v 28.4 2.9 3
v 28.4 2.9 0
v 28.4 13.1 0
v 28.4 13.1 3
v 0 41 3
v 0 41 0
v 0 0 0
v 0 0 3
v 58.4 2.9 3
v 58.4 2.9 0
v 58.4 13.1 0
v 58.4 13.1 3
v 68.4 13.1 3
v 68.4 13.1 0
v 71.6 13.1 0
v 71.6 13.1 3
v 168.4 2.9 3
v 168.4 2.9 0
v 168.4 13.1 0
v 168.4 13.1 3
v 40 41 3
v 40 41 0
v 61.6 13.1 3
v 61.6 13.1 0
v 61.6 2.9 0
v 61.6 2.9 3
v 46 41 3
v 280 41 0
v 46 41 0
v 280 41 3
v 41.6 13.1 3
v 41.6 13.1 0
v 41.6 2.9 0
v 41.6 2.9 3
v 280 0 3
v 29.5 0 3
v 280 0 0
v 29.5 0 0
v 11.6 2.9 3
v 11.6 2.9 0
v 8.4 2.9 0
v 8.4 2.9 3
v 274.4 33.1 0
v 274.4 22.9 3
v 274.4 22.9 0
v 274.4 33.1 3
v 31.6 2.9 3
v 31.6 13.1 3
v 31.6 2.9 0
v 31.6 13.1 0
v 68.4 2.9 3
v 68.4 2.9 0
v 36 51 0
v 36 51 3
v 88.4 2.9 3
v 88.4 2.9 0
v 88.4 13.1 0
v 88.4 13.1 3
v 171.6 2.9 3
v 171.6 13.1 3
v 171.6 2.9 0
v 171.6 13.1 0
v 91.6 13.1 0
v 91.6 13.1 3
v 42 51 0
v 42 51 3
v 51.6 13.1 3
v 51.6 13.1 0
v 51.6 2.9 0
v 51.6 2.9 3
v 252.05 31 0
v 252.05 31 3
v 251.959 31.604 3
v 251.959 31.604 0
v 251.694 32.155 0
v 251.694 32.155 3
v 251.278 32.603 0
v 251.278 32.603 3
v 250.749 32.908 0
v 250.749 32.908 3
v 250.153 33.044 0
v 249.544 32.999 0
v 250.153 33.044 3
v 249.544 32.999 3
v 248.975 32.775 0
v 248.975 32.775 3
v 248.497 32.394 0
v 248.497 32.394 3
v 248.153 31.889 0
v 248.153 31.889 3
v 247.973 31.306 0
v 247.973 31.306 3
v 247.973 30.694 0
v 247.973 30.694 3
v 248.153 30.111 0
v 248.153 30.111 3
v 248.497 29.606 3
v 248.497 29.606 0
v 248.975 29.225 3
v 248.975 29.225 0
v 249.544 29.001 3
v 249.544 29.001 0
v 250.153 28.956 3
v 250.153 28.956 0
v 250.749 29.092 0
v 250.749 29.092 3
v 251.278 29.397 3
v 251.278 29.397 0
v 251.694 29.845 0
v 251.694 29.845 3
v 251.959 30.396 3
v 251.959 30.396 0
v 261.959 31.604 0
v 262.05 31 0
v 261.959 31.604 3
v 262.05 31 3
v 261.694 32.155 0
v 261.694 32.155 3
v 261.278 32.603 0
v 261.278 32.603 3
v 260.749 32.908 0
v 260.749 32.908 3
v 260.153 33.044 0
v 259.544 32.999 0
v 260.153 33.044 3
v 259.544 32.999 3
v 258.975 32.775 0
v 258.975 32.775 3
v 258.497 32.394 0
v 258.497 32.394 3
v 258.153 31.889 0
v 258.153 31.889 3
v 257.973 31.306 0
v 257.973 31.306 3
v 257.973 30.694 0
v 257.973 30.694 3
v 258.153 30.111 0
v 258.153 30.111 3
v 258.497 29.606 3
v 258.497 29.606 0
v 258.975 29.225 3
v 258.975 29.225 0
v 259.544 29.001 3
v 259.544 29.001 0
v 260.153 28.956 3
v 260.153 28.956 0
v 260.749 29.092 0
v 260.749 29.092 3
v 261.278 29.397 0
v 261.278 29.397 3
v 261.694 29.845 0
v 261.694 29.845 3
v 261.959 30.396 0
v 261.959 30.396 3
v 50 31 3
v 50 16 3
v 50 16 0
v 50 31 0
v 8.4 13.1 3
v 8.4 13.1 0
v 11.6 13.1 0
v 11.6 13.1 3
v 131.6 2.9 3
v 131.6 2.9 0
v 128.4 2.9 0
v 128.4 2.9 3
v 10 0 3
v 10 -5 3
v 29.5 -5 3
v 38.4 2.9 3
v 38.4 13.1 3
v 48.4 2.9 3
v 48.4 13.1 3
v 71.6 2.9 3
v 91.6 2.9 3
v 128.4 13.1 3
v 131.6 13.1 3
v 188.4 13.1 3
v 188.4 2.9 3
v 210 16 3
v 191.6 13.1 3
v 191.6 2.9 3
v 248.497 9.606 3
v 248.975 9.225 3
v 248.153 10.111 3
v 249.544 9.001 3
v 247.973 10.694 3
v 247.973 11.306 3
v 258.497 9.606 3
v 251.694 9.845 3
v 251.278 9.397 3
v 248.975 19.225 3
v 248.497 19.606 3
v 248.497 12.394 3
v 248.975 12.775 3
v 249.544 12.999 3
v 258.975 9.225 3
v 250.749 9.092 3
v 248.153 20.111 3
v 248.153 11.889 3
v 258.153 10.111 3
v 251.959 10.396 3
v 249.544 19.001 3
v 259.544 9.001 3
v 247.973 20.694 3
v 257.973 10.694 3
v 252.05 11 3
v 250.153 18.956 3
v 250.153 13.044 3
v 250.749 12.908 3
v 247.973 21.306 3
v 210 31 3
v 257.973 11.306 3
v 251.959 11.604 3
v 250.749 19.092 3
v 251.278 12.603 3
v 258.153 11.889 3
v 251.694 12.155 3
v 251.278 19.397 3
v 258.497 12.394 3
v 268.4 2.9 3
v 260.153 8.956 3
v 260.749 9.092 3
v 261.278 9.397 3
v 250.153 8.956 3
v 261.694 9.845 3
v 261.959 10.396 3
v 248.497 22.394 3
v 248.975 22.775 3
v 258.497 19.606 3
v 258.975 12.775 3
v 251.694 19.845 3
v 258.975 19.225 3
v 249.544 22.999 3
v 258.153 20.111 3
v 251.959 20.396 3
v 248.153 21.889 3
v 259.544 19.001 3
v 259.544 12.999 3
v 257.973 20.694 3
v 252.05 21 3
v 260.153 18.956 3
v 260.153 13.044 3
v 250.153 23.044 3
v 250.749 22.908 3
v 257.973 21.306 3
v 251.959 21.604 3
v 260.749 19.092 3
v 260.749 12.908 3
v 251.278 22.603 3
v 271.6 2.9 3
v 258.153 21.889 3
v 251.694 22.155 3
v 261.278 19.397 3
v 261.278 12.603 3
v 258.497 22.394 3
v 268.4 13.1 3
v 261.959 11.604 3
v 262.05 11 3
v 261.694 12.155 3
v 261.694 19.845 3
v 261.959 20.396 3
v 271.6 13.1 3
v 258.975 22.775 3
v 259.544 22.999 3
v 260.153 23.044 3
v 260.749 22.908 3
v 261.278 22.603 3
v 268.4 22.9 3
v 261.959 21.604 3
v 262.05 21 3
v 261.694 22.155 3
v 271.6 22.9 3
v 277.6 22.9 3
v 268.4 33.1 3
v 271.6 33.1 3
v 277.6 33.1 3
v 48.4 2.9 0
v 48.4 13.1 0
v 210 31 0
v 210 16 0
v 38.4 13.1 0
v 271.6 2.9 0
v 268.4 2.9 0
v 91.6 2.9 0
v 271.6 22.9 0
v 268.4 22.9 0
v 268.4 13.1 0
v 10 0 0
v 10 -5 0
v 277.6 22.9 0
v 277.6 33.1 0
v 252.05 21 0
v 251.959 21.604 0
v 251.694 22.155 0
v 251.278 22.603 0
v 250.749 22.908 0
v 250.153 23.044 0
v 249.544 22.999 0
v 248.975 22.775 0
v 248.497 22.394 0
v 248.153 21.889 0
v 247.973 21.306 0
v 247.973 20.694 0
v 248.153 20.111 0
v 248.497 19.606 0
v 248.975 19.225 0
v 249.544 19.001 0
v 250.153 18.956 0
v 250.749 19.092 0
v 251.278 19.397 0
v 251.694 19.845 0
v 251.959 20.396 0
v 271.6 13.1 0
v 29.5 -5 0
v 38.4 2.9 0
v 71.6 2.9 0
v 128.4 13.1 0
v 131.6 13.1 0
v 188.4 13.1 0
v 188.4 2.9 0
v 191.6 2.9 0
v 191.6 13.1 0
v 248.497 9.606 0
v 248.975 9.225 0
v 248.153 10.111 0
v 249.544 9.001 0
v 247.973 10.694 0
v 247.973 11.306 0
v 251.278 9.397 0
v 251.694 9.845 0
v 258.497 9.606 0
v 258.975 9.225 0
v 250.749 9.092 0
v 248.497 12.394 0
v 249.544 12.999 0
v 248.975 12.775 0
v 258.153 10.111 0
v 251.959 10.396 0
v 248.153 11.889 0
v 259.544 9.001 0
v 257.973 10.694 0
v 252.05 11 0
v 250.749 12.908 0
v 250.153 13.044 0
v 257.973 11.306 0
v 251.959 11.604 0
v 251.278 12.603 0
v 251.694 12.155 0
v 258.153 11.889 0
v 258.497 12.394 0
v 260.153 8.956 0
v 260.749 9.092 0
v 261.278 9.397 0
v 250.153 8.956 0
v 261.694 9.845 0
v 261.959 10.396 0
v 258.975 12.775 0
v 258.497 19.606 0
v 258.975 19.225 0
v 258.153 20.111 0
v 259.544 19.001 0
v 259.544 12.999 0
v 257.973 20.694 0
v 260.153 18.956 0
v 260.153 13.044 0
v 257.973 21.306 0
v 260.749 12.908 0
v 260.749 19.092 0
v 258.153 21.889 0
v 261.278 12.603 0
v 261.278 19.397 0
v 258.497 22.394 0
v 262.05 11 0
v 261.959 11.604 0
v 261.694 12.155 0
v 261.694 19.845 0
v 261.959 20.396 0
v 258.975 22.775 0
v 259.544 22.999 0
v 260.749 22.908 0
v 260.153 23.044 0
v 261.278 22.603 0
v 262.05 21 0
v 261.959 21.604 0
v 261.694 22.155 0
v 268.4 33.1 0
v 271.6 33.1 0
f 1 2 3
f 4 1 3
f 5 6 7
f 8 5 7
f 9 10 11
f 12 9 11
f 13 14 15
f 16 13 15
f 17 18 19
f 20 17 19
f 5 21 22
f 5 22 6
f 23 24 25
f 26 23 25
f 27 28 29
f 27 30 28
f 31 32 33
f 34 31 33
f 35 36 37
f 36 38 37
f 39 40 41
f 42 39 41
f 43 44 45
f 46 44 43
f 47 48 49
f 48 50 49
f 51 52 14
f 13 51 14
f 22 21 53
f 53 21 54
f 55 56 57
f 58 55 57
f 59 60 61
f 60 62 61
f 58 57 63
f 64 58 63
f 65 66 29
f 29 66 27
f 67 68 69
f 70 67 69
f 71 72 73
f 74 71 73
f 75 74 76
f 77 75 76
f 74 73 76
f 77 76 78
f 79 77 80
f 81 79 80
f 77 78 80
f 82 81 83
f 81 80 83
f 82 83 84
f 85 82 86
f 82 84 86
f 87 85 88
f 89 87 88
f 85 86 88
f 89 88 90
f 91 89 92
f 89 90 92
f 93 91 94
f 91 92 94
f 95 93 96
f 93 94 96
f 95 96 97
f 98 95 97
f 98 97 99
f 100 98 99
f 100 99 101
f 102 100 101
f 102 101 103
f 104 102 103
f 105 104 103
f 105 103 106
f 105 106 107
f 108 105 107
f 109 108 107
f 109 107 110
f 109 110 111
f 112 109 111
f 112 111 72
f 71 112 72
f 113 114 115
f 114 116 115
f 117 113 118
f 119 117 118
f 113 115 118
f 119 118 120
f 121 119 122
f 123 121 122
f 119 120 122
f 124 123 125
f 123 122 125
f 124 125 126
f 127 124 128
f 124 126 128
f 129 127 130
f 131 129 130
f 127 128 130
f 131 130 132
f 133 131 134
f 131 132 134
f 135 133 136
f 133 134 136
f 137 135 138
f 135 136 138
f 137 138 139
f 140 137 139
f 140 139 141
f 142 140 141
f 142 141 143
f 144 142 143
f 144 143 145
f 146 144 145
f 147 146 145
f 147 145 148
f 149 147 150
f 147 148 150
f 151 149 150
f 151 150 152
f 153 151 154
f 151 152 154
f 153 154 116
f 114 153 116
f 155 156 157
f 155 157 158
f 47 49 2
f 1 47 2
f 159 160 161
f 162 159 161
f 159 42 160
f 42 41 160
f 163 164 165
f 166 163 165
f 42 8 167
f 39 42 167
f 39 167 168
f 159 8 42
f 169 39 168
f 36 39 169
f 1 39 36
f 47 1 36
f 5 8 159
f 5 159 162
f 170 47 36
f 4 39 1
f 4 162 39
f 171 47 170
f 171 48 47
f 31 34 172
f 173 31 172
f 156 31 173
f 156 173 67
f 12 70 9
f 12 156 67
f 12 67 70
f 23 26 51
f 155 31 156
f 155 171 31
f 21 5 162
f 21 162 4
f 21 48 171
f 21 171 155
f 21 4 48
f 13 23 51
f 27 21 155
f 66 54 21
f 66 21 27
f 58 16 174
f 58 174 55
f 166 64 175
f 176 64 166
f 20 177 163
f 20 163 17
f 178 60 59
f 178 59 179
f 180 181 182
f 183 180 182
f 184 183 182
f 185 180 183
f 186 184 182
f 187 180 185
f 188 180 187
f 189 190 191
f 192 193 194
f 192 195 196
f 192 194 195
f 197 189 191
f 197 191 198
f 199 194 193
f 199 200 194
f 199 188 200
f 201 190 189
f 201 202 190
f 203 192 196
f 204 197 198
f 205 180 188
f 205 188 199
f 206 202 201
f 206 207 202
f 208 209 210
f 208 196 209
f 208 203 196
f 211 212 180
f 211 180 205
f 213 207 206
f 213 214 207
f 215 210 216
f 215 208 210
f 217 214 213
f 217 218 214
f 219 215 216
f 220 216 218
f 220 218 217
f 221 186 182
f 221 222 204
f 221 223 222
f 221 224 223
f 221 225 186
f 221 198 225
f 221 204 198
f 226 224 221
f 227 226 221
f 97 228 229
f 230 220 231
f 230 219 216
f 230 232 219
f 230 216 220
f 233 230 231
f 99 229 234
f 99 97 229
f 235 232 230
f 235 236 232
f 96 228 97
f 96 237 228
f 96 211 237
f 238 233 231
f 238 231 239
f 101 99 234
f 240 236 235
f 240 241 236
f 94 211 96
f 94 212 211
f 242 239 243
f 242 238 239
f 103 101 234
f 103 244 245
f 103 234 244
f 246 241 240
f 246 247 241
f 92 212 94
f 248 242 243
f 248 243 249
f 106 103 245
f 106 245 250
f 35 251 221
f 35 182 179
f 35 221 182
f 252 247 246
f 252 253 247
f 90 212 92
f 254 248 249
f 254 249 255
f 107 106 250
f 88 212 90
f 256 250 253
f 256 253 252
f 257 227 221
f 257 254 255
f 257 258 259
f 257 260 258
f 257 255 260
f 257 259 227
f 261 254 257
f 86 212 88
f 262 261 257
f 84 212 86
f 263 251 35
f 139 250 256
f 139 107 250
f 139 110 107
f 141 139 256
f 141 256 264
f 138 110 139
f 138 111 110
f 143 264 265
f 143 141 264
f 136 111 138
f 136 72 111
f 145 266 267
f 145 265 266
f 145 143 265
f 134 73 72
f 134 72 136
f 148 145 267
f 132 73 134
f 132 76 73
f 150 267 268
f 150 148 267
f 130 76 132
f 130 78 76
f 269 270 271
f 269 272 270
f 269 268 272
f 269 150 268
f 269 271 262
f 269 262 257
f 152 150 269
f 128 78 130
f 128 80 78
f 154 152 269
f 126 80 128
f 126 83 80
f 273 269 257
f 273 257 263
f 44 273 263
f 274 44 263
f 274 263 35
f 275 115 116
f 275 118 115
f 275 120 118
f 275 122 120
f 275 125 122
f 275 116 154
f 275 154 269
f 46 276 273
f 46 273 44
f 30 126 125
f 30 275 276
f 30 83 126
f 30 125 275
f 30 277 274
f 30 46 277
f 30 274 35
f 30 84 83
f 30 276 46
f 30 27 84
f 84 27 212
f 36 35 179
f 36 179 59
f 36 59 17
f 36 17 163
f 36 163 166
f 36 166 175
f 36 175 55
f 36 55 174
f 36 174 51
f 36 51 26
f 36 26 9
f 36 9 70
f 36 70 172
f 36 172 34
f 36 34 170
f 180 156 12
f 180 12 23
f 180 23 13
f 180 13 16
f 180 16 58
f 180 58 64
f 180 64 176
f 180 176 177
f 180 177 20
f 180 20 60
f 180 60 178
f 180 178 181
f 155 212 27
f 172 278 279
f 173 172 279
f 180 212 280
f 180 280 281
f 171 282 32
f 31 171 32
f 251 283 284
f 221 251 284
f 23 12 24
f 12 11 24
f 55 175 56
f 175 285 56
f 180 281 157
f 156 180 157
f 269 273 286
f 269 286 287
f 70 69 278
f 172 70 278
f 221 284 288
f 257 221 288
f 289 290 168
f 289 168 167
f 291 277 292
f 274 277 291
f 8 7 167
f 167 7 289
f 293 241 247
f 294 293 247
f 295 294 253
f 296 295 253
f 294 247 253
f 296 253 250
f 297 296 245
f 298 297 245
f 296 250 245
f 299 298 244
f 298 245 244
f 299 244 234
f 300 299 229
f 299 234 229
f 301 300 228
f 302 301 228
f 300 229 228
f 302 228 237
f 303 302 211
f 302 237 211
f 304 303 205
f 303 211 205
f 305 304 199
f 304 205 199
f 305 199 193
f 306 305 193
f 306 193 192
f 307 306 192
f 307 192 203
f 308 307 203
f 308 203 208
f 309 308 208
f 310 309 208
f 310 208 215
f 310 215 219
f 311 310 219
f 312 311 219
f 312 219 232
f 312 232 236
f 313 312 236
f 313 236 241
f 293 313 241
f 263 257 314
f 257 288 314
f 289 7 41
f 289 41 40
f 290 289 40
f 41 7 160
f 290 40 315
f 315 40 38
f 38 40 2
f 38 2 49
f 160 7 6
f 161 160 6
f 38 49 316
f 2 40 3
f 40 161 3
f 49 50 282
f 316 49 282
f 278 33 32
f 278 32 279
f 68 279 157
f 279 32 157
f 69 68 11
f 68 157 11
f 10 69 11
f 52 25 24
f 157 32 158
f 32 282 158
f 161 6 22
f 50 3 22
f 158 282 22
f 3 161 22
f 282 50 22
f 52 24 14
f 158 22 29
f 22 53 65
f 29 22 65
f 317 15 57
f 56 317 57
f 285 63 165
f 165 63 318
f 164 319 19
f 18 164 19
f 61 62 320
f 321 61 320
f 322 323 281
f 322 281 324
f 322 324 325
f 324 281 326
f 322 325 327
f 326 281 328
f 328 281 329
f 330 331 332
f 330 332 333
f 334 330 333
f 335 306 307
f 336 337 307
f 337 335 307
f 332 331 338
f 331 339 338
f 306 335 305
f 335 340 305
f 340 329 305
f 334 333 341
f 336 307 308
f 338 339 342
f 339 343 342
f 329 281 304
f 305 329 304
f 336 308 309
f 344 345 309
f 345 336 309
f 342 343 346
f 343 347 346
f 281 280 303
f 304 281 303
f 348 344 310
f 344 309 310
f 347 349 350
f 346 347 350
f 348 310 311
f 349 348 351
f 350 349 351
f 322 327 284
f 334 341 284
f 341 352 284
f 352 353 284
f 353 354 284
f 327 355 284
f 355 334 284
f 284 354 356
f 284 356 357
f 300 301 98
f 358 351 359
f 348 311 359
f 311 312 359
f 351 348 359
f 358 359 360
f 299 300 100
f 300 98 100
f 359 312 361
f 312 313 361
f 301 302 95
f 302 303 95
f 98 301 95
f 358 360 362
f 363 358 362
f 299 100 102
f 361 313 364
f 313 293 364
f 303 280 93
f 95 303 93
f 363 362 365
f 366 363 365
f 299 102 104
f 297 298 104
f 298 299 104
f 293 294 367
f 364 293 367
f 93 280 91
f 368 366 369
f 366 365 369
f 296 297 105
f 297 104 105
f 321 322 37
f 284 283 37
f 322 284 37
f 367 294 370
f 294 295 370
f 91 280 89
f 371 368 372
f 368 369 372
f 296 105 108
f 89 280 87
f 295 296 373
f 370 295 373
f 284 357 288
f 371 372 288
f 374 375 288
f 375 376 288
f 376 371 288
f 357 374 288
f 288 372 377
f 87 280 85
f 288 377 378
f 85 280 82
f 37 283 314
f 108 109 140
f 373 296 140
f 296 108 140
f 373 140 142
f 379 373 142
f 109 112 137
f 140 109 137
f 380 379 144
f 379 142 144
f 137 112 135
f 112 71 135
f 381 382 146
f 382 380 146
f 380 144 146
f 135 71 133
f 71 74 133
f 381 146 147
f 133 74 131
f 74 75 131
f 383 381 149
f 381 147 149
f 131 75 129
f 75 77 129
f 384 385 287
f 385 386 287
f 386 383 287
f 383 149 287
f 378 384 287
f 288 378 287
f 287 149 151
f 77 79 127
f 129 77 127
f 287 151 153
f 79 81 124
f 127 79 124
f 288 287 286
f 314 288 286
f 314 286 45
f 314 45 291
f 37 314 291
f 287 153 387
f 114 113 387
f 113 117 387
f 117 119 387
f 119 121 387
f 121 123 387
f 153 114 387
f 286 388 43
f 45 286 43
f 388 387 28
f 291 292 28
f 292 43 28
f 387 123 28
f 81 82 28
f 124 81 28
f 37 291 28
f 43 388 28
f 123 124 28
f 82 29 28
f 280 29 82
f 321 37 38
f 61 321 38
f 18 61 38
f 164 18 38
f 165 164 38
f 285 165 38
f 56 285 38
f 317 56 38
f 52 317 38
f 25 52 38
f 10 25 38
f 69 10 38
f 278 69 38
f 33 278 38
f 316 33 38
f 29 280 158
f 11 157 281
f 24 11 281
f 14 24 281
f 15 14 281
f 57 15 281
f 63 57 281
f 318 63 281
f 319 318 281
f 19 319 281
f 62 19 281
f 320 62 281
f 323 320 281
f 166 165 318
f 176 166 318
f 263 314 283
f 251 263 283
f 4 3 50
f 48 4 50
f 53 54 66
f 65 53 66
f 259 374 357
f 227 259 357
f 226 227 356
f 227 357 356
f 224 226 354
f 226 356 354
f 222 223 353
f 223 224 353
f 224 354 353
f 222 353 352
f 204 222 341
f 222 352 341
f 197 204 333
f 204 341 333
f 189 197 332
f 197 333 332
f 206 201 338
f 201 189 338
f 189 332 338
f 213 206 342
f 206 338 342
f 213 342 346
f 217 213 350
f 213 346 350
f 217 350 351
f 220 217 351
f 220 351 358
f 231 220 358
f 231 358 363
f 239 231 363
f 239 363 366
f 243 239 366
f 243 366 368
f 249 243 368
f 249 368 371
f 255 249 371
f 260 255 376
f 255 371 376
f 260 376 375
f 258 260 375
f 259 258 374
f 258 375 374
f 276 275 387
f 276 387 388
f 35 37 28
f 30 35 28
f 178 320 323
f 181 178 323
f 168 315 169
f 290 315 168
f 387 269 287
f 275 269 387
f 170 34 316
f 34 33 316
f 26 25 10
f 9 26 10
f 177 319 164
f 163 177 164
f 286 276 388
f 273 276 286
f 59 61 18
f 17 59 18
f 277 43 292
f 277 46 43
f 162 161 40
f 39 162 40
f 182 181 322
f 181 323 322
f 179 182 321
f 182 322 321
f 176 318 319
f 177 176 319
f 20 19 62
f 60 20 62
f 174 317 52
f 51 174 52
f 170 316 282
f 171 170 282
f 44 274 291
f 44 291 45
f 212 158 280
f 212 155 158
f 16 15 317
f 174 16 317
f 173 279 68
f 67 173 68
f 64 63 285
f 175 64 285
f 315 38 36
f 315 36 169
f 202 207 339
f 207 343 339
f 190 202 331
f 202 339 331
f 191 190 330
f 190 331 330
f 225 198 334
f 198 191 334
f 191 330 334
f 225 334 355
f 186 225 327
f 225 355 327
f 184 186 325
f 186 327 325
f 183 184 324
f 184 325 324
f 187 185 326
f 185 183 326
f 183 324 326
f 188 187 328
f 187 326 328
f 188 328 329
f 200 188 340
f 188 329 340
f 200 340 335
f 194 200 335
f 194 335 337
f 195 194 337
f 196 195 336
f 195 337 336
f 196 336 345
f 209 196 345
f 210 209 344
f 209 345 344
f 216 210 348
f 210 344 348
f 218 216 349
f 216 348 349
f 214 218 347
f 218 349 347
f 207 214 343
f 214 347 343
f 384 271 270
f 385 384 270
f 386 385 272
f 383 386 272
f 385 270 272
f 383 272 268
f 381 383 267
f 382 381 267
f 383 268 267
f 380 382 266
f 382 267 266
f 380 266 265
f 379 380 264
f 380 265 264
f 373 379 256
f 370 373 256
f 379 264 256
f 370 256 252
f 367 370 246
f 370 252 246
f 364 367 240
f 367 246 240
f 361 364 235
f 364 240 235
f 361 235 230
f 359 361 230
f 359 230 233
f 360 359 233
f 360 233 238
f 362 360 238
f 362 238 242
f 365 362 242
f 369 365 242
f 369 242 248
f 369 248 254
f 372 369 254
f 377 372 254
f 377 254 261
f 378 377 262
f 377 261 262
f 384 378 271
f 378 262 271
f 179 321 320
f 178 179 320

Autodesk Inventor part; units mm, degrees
ref_plane "YZ Plane" through (0, 0, 0) normal (1, 0, 0) x (0, 1, 0)
ref_plane "XZ Plane" through (0, 0, 0) normal (0, 1, 0) x (-1, 0, 0)
ref_plane "XY Plane" through (0, 0, 0) normal (0, 0, 1) x (1, 0, 0)
sketch "Sketch1" plane through (0, 0, 0) normal (0, 0, 1) x (1, 0, 0)
  line L0 (0, 0) -> (280, 0)
  line L1 (280, 0) -> (280, 16)
  line L2 (280, 16) -> (0, 16)
  line L3 (0, 16) -> (0, 0)
  line L4 (0, 0) -> (22.0483, 0)
  line L5 (10, 0) -> (29.5, 0)
  line L6 (29.5, 0) -> (29.5, -5)
  line L7 (29.5, -5) -> (10, -5)
  line L8 (10, -5) -> (10, 0)
  line L9 (8.4, 13.1) -> (11.6, 13.1)
  line L10 (11.6, 13.1) -> (11.6, 2.9)
  line L11 (11.6, 2.9) -> (8.4, 2.9)
  line L12 (8.4, 2.9) -> (8.4, 13.1)
  line L13 (8.4, 13.1) -> (11.6, 2.9) construction
  line L14 (11.6, 13.1) -> (8.4, 2.9) construction
  line L15 (268.4, 13.1) -> (271.6, 13.1)
  line L16 (271.6, 13.1) -> (271.6, 2.9)
  line L17 (271.6, 2.9) -> (268.4, 2.9)
  line L18 (268.4, 2.9) -> (268.4, 13.1)
  line L19 (268.4, 13.1) -> (271.6, 2.9) construction
  line L20 (271.6, 13.1) -> (268.4, 2.9) construction
  circle A0 centre (260, 11) radius 2.05
  circle A1 centre (250, 11) radius 2.05
  line L21 (48.4, 13.1) -> (51.6, 13.1)
  line L22 (51.6, 13.1) -> (51.6, 2.9)
  line L23 (51.6, 2.9) -> (48.4, 2.9)
  line L24 (48.4, 2.9) -> (48.4, 13.1)
  line L25 (48.4, 13.1) -> (51.6, 2.9) construction
  line L26 (51.6, 13.1) -> (48.4, 2.9) construction
  line L27 (88.4, 13.1) -> (91.6, 13.1)
  line L28 (91.6, 13.1) -> (91.6, 2.9)
  line L29 (91.6, 2.9) -> (88.4, 2.9)
  line L30 (88.4, 2.9) -> (88.4, 13.1)
  line L31 (88.4, 13.1) -> (91.6, 2.9) construction
  line L32 (91.6, 13.1) -> (88.4, 2.9) construction
  line L33 (128.4, 13.1) -> (131.6, 13.1)
  line L34 (131.6, 13.1) -> (131.6, 2.9)
  line L35 (131.6, 2.9) -> (128.4, 2.9)
  line L36 (128.4, 2.9) -> (128.4, 13.1)
  line L37 (128.4, 13.1) -> (131.6, 2.9) construction
  line L38 (131.6, 13.1) -> (128.4, 2.9) construction
  line L39 (168.4, 13.1) -> (171.6, 13.1)
  line L40 (171.6, 13.1) -> (171.6, 2.9)
  line L41 (171.6, 2.9) -> (168.4, 2.9)
  line L42 (168.4, 2.9) -> (168.4, 13.1)
  line L43 (168.4, 13.1) -> (171.6, 2.9) construction
  line L44 (171.6, 13.1) -> (168.4, 2.9) construction
  line L45 (188.4, 13.1) -> (191.6, 13.1)
  line L46 (191.6, 13.1) -> (191.6, 2.9)
  line L47 (191.6, 2.9) -> (188.4, 2.9)
  line L48 (188.4, 2.9) -> (188.4, 13.1)
  line L49 (188.4, 13.1) -> (191.6, 2.9) construction
  line L50 (191.6, 13.1) -> (188.4, 2.9) construction
  line L51 (31.6, 13.1) -> (31.6, 2.9)
  line L52 (28.4, 13.1) -> (31.6, 13.1)
  line L53 (28.4, 2.9) -> (28.4, 13.1)
  line L54 (31.6, 13.1) -> (28.4, 2.9) construction
  line L55 (31.6, 2.9) -> (28.4, 2.9)
  line L56 (28.4, 13.1) -> (31.6, 2.9) construction
  line L57 (71.6, 13.1) -> (71.6, 2.9)
  line L58 (68.4, 13.1) -> (71.6, 13.1)
  line L59 (68.4, 2.9) -> (68.4, 13.1)
  line L60 (71.6, 13.1) -> (68.4, 2.9) construction
  line L61 (71.6, 2.9) -> (68.4, 2.9)
  line L62 (68.4, 13.1) -> (71.6, 2.9) construction
  line L63 (41.6, 13.1) -> (41.6, 2.9)
  line L64 (38.4, 13.1) -> (41.6, 13.1)
  line L65 (38.4, 2.9) -> (38.4, 13.1)
  line L66 (41.6, 13.1) -> (38.4, 2.9) construction
  line L67 (41.6, 2.9) -> (38.4, 2.9)
  line L68 (38.4, 13.1) -> (41.6, 2.9) construction
  line L69 (61.6, 13.1) -> (61.6, 2.9)
  line L70 (58.4, 13.1) -> (61.6, 13.1)
  line L71 (58.4, 2.9) -> (58.4, 13.1)
  line L72 (61.6, 13.1) -> (58.4, 2.9) construction
  line L73 (61.6, 2.9) -> (58.4, 2.9)
  line L74 (58.4, 13.1) -> (61.6, 2.9) construction
  point P0 (10, 8)
  point P1 (0, 8)
  point P2 (270, 8)
  point P3 (50, 8)
  point P4 (90, 8)
  point P5 (130, 8)
  point P6 (170, 8)
  point P7 (190, 8)
  point P8 (30, 8)
  point P9 (70, 8)
  point P10 (40, 8)
  point P11 (60, 8)
  dimension "d2" = 19.5
  dimension "d3" = 5
  dimension "d4" = 10
  dimension "d5" = 16
  dimension "d8" = 280
  dimension "d10" = 10.2
  dimension "d11" = 3.2
  dimension "d12" = 10
  dimension "d13" = 10.2
  dimension "d14" = 3.2
  dimension "d15" = 10
  dimension "d16" = 4.1
  dimension "d18" = 4.1
  dimension "d20" = 10
  dimension "d21" = 20
  dimension "d23" = 5
  dimension "d26" = 10.2
  dimension "d27" = 3.2
  dimension "d28" = 10.2
  dimension "d29" = 3.2
  dimension "d30" = 10.2
  dimension "d31" = 3.2
  dimension "d32" = 10.2
  dimension "d33" = 3.2
  dimension "d34" = 10.2
  dimension "d35" = 3.2
  dimension "d36" = 40
  dimension "d37" = 40
  dimension "d38" = 40
  dimension "d39" = 40
  dimension "d40" = 20
  dimension "d41" = 10.2
  dimension "d42" = 3.2
  dimension "d43" = 20
  dimension "d54" = 10.2
  dimension "d55" = 3.2
  dimension "d56" = 10.2
  dimension "d57" = 3.2
  dimension "d58" = 10.2
  dimension "d59" = 3.2
  dimension "d60" = 10
  dimension "d61" = 10
  dimension "d62" = 10
extrude "Extrusion1" add sketch "Sketch1" along normal blind 3
sketch "Sketch2" plane through (0, 0, 3) normal (0, 0, 1) x (1, 0, 0)
  line L0 (0, 16) -> (0, 0) projected
  line L1 (0, 16) -> (0, 41)
  line L2 (280, 0) -> (280, 16) projected
  line L3 (280, 16) -> (280, 41)
  line L4 (280, 41) -> (0, 41)
  line L5 (280, 16) -> (0, 16) projected
  line L6 (50, 16) -> (50, 31)
  line L7 (50, 31) -> (210, 31)
  line L8 (210, 31) -> (210, 16)
  line L9 (40, 41) -> (36, 51)
  line L10 (36, 51) -> (42, 51)
  line L11 (42, 51) -> (46, 41)
  circle A0 centre (250, 31) radius 2.05
  circle A1 centre (260, 31) radius 2.05
  circle A2 centre (250, 21) radius 2.05
  circle A3 centre (260, 21) radius 2.05
  circle A4 centre (260, 11) radius 2.05 projected
  line L12 (268.4, 33.1) -> (271.6, 33.1)
  line L13 (271.6, 33.1) -> (271.6, 22.9)
  line L14 (271.6, 22.9) -> (268.4, 22.9)
  line L15 (268.4, 22.9) -> (268.4, 33.1)
  line L16 (268.4, 33.1) -> (271.6, 22.9) construction
  line L17 (271.6, 33.1) -> (268.4, 22.9) construction
  line L18 (268.4, 13.1) -> (271.6, 13.1) projected
  line L19 (271.6, 13.1) -> (271.6, 2.9) projected
  line L20 (274.4, 33.1) -> (277.6, 33.1)
  line L21 (277.6, 33.1) -> (277.6, 22.9)
  line L22 (277.6, 22.9) -> (274.4, 22.9)
  line L23 (274.4, 22.9) -> (274.4, 33.1)
  line L24 (274.4, 33.1) -> (277.6, 22.9) construction
  line L25 (277.6, 33.1) -> (274.4, 22.9) construction
  point P0 (270, 28)
  point P1 (270, 13.1)
  point P2 (271.6, 8)
  point P3 (276, 28)
  dimension "d44" = 25
  dimension "d45" = 160
  dimension "d46" = 50
  dimension "d47" = 15
  dimension "d48" = 10
  dimension "d49" = 6
  dimension "d50" = 4
  dimension "d51" = 40
  dimension "d63" = 4.1
  dimension "d64" = 4.1
  dimension "d65" = 4.1
  dimension "d66" = 4.1
  dimension "d67" = 20
  dimension "d68" = 10
  dimension "d69" = 10
  dimension "d70" = 10
  dimension "d71" = 10.2
  dimension "d72" = 20
  dimension "d73" = 3.2
  dimension "d74" = 6
extrude "Extrusion2" add sketch "Sketch2" against normal blind 3 contours L1 L4 L3 L5 L8 L7 L6 | L9 L10 L11 L4
properties part number "Middle_bar"
